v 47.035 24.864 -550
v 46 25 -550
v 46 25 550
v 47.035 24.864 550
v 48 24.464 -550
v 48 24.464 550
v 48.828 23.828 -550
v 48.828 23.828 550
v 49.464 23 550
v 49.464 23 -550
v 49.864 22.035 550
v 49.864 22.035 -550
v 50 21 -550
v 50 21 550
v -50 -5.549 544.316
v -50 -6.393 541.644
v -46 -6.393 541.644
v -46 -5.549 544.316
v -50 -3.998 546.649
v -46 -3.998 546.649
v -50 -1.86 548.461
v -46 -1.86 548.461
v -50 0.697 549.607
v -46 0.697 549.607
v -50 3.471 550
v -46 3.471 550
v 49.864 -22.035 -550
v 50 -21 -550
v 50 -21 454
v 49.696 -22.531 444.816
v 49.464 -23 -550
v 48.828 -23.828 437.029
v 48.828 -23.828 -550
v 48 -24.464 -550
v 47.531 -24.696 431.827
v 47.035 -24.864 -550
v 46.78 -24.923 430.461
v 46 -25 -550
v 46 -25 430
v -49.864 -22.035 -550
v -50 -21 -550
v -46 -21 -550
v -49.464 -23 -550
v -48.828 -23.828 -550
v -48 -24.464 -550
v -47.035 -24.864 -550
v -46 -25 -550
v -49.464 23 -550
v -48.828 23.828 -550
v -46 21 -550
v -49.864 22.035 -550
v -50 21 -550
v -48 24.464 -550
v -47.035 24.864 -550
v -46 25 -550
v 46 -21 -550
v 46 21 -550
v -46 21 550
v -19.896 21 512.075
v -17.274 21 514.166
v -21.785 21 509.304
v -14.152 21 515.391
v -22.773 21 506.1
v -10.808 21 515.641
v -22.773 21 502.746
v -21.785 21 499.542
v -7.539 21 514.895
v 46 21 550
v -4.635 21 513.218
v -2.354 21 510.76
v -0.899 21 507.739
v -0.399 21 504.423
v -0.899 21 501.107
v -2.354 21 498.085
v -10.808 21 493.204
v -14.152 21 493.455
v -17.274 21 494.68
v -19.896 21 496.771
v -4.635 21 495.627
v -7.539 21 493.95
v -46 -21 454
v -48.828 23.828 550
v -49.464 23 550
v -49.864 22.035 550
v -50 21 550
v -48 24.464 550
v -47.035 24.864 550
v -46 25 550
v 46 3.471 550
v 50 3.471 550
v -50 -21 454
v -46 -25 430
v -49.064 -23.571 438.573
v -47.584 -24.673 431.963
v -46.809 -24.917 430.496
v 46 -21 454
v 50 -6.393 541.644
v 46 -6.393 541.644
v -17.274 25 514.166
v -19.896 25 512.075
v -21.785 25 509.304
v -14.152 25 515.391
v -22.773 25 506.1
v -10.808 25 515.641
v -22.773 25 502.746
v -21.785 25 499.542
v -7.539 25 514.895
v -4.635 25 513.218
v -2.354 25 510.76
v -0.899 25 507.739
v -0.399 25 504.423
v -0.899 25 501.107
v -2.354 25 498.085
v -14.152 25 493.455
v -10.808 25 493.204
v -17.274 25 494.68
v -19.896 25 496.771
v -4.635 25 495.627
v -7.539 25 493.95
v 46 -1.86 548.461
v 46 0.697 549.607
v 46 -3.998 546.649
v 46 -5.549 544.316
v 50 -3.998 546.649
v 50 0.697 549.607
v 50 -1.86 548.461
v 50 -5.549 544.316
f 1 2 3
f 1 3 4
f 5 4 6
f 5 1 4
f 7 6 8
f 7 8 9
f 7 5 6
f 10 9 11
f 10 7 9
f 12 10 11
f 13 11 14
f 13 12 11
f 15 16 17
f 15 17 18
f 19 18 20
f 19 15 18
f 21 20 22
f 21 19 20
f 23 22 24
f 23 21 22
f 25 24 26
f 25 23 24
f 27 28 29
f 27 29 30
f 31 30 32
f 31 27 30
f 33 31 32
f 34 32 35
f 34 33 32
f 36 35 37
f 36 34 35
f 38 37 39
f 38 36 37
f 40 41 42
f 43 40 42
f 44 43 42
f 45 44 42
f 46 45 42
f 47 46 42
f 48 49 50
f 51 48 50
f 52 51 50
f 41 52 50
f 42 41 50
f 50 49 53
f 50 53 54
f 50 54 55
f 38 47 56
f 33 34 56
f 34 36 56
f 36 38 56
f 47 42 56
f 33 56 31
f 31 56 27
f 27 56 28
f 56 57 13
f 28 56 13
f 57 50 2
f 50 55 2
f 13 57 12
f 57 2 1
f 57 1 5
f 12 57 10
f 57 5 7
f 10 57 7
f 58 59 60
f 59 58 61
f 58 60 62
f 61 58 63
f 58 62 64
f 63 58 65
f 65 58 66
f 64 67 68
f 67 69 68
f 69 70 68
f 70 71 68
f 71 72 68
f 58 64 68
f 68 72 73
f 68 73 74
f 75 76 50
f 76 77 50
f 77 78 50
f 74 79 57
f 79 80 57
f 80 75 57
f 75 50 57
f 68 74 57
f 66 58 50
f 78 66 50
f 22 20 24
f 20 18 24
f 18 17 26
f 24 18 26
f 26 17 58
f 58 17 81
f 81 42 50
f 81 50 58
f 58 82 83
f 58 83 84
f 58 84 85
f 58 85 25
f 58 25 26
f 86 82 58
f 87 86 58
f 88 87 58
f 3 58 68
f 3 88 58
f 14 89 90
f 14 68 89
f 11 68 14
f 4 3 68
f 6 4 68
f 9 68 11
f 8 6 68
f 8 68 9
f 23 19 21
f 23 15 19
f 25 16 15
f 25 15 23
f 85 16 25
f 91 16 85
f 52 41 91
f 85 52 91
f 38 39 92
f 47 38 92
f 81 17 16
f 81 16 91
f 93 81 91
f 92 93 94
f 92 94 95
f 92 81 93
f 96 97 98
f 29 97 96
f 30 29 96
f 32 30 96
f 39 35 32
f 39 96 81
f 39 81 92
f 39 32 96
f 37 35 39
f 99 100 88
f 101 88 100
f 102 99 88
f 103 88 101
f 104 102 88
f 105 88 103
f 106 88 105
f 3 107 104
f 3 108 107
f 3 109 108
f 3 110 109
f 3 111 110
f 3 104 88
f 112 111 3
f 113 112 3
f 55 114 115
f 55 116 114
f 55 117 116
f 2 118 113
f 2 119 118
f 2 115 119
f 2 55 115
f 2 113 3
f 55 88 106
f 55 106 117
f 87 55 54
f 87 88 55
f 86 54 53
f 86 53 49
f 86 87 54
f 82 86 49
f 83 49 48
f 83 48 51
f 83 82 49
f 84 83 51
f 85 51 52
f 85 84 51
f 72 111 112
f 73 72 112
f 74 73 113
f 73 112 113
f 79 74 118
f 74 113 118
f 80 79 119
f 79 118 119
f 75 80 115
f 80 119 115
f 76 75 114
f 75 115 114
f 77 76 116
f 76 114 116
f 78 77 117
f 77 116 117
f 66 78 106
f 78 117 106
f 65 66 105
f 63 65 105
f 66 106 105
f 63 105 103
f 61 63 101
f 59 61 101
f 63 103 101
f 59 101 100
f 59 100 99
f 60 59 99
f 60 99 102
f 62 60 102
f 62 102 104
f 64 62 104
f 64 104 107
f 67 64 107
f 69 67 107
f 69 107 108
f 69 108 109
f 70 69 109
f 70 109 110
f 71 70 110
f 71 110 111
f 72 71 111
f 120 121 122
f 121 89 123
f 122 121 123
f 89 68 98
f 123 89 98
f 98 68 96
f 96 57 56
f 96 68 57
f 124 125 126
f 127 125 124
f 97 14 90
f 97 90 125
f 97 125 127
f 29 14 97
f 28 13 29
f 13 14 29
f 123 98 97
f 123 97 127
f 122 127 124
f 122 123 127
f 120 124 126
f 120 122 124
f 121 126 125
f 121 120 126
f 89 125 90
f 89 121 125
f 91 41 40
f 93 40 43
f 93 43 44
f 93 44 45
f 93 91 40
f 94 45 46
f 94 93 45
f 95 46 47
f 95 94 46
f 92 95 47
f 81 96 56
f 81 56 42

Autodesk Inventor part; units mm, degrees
ref_plane "YZ Plane" through (0, 0, 0) normal (1, 0, 0) x (0, 1, 0)
ref_plane "XZ Plane" through (0, 0, 0) normal (0, 1, 0) x (-1, 0, 0)
ref_plane "XY Plane" through (0, 0, 0) normal (0, 0, 1) x (1, 0, 0)
sketch "Sketch1" plane through (0, 0, 0) normal (0, 0, 1) x (1, 0, 0)
  line L0 (-50, 25) -> (50, 25)
  line L1 (50, 25) -> (50, -25)
  line L2 (50, -25) -> (-50, -25)
  line L3 (-50, -25) -> (-50, 25)
  line L4 (-50, 25) -> (50, -25) construction
  line L5 (50, 25) -> (-50, -25) construction
  point P0 (0, 0)
  dimension "d0" = 100
  dimension "d1" = 50
extrude "Extrusion1" add sketch "Sketch1" along normal mid plane 1100
fillet "Fillet1" radius 4 4 edges at (50, -25, 0) (50, 25, 0) (-50, -25, 0) (-50, 25, 0)
shell "Shell1" thickness 4 removed faces 2 at (-15.3333, -8.3333, 550) at (-15.3333, -8.3333, -550)
sketch "Sketch2" plane through (-46, 25, 550) normal (0, 1, 0) x (1, 0, 0)
  circle A0 centre (34.3509, 45.5772) radius 11.25 projected
  point P0 (46, 550)
extrude "Extrusion2" cut sketch "Sketch2" against normal through all
sketch "Sketch3" plane through (50, -21, 550) normal (1, 0, 0) x (0, 0, -1)
  line L0 (0, -4) -> (1100, -4) projected
  line L1 (0, 42) -> (0, 0) projected
  line L2 (0, 16) -> (120, -4)
  line L3 (0, -11.4428) -> (0, 16)
  line L4 (120, -4) -> (120, -11.4428)
  line L5 (120, -11.4428) -> (0, -11.4428)
  point P0 (550, 21)
  dimension "d8" = 120
  dimension "d9" = 20
extrude "Extrusion3" cut sketch "Sketch3" against normal blind 1100
fillet "Fillet2" radius 10 2 edges at (48, -5, 550) (-48, -5, 550)
sketch "Sketch4" plane through (-46, 25, 550) normal (0, 1, 0) x (1, 0, 0)
  line L0 (90.5966, 11.6068) -> (90.5966, 2.7213) construction
  line L1 (90.5966, 2.7213) -> (86.2672, 2.7213) construction
  line L2 (86.2672, 2.7213) -> (86.2672, 11.6068) construction
  line L3 (86.2672, 11.6068) -> (90.5966, 11.6068) construction
  point P0 (46, 550)
properties part number "MC02-1"
